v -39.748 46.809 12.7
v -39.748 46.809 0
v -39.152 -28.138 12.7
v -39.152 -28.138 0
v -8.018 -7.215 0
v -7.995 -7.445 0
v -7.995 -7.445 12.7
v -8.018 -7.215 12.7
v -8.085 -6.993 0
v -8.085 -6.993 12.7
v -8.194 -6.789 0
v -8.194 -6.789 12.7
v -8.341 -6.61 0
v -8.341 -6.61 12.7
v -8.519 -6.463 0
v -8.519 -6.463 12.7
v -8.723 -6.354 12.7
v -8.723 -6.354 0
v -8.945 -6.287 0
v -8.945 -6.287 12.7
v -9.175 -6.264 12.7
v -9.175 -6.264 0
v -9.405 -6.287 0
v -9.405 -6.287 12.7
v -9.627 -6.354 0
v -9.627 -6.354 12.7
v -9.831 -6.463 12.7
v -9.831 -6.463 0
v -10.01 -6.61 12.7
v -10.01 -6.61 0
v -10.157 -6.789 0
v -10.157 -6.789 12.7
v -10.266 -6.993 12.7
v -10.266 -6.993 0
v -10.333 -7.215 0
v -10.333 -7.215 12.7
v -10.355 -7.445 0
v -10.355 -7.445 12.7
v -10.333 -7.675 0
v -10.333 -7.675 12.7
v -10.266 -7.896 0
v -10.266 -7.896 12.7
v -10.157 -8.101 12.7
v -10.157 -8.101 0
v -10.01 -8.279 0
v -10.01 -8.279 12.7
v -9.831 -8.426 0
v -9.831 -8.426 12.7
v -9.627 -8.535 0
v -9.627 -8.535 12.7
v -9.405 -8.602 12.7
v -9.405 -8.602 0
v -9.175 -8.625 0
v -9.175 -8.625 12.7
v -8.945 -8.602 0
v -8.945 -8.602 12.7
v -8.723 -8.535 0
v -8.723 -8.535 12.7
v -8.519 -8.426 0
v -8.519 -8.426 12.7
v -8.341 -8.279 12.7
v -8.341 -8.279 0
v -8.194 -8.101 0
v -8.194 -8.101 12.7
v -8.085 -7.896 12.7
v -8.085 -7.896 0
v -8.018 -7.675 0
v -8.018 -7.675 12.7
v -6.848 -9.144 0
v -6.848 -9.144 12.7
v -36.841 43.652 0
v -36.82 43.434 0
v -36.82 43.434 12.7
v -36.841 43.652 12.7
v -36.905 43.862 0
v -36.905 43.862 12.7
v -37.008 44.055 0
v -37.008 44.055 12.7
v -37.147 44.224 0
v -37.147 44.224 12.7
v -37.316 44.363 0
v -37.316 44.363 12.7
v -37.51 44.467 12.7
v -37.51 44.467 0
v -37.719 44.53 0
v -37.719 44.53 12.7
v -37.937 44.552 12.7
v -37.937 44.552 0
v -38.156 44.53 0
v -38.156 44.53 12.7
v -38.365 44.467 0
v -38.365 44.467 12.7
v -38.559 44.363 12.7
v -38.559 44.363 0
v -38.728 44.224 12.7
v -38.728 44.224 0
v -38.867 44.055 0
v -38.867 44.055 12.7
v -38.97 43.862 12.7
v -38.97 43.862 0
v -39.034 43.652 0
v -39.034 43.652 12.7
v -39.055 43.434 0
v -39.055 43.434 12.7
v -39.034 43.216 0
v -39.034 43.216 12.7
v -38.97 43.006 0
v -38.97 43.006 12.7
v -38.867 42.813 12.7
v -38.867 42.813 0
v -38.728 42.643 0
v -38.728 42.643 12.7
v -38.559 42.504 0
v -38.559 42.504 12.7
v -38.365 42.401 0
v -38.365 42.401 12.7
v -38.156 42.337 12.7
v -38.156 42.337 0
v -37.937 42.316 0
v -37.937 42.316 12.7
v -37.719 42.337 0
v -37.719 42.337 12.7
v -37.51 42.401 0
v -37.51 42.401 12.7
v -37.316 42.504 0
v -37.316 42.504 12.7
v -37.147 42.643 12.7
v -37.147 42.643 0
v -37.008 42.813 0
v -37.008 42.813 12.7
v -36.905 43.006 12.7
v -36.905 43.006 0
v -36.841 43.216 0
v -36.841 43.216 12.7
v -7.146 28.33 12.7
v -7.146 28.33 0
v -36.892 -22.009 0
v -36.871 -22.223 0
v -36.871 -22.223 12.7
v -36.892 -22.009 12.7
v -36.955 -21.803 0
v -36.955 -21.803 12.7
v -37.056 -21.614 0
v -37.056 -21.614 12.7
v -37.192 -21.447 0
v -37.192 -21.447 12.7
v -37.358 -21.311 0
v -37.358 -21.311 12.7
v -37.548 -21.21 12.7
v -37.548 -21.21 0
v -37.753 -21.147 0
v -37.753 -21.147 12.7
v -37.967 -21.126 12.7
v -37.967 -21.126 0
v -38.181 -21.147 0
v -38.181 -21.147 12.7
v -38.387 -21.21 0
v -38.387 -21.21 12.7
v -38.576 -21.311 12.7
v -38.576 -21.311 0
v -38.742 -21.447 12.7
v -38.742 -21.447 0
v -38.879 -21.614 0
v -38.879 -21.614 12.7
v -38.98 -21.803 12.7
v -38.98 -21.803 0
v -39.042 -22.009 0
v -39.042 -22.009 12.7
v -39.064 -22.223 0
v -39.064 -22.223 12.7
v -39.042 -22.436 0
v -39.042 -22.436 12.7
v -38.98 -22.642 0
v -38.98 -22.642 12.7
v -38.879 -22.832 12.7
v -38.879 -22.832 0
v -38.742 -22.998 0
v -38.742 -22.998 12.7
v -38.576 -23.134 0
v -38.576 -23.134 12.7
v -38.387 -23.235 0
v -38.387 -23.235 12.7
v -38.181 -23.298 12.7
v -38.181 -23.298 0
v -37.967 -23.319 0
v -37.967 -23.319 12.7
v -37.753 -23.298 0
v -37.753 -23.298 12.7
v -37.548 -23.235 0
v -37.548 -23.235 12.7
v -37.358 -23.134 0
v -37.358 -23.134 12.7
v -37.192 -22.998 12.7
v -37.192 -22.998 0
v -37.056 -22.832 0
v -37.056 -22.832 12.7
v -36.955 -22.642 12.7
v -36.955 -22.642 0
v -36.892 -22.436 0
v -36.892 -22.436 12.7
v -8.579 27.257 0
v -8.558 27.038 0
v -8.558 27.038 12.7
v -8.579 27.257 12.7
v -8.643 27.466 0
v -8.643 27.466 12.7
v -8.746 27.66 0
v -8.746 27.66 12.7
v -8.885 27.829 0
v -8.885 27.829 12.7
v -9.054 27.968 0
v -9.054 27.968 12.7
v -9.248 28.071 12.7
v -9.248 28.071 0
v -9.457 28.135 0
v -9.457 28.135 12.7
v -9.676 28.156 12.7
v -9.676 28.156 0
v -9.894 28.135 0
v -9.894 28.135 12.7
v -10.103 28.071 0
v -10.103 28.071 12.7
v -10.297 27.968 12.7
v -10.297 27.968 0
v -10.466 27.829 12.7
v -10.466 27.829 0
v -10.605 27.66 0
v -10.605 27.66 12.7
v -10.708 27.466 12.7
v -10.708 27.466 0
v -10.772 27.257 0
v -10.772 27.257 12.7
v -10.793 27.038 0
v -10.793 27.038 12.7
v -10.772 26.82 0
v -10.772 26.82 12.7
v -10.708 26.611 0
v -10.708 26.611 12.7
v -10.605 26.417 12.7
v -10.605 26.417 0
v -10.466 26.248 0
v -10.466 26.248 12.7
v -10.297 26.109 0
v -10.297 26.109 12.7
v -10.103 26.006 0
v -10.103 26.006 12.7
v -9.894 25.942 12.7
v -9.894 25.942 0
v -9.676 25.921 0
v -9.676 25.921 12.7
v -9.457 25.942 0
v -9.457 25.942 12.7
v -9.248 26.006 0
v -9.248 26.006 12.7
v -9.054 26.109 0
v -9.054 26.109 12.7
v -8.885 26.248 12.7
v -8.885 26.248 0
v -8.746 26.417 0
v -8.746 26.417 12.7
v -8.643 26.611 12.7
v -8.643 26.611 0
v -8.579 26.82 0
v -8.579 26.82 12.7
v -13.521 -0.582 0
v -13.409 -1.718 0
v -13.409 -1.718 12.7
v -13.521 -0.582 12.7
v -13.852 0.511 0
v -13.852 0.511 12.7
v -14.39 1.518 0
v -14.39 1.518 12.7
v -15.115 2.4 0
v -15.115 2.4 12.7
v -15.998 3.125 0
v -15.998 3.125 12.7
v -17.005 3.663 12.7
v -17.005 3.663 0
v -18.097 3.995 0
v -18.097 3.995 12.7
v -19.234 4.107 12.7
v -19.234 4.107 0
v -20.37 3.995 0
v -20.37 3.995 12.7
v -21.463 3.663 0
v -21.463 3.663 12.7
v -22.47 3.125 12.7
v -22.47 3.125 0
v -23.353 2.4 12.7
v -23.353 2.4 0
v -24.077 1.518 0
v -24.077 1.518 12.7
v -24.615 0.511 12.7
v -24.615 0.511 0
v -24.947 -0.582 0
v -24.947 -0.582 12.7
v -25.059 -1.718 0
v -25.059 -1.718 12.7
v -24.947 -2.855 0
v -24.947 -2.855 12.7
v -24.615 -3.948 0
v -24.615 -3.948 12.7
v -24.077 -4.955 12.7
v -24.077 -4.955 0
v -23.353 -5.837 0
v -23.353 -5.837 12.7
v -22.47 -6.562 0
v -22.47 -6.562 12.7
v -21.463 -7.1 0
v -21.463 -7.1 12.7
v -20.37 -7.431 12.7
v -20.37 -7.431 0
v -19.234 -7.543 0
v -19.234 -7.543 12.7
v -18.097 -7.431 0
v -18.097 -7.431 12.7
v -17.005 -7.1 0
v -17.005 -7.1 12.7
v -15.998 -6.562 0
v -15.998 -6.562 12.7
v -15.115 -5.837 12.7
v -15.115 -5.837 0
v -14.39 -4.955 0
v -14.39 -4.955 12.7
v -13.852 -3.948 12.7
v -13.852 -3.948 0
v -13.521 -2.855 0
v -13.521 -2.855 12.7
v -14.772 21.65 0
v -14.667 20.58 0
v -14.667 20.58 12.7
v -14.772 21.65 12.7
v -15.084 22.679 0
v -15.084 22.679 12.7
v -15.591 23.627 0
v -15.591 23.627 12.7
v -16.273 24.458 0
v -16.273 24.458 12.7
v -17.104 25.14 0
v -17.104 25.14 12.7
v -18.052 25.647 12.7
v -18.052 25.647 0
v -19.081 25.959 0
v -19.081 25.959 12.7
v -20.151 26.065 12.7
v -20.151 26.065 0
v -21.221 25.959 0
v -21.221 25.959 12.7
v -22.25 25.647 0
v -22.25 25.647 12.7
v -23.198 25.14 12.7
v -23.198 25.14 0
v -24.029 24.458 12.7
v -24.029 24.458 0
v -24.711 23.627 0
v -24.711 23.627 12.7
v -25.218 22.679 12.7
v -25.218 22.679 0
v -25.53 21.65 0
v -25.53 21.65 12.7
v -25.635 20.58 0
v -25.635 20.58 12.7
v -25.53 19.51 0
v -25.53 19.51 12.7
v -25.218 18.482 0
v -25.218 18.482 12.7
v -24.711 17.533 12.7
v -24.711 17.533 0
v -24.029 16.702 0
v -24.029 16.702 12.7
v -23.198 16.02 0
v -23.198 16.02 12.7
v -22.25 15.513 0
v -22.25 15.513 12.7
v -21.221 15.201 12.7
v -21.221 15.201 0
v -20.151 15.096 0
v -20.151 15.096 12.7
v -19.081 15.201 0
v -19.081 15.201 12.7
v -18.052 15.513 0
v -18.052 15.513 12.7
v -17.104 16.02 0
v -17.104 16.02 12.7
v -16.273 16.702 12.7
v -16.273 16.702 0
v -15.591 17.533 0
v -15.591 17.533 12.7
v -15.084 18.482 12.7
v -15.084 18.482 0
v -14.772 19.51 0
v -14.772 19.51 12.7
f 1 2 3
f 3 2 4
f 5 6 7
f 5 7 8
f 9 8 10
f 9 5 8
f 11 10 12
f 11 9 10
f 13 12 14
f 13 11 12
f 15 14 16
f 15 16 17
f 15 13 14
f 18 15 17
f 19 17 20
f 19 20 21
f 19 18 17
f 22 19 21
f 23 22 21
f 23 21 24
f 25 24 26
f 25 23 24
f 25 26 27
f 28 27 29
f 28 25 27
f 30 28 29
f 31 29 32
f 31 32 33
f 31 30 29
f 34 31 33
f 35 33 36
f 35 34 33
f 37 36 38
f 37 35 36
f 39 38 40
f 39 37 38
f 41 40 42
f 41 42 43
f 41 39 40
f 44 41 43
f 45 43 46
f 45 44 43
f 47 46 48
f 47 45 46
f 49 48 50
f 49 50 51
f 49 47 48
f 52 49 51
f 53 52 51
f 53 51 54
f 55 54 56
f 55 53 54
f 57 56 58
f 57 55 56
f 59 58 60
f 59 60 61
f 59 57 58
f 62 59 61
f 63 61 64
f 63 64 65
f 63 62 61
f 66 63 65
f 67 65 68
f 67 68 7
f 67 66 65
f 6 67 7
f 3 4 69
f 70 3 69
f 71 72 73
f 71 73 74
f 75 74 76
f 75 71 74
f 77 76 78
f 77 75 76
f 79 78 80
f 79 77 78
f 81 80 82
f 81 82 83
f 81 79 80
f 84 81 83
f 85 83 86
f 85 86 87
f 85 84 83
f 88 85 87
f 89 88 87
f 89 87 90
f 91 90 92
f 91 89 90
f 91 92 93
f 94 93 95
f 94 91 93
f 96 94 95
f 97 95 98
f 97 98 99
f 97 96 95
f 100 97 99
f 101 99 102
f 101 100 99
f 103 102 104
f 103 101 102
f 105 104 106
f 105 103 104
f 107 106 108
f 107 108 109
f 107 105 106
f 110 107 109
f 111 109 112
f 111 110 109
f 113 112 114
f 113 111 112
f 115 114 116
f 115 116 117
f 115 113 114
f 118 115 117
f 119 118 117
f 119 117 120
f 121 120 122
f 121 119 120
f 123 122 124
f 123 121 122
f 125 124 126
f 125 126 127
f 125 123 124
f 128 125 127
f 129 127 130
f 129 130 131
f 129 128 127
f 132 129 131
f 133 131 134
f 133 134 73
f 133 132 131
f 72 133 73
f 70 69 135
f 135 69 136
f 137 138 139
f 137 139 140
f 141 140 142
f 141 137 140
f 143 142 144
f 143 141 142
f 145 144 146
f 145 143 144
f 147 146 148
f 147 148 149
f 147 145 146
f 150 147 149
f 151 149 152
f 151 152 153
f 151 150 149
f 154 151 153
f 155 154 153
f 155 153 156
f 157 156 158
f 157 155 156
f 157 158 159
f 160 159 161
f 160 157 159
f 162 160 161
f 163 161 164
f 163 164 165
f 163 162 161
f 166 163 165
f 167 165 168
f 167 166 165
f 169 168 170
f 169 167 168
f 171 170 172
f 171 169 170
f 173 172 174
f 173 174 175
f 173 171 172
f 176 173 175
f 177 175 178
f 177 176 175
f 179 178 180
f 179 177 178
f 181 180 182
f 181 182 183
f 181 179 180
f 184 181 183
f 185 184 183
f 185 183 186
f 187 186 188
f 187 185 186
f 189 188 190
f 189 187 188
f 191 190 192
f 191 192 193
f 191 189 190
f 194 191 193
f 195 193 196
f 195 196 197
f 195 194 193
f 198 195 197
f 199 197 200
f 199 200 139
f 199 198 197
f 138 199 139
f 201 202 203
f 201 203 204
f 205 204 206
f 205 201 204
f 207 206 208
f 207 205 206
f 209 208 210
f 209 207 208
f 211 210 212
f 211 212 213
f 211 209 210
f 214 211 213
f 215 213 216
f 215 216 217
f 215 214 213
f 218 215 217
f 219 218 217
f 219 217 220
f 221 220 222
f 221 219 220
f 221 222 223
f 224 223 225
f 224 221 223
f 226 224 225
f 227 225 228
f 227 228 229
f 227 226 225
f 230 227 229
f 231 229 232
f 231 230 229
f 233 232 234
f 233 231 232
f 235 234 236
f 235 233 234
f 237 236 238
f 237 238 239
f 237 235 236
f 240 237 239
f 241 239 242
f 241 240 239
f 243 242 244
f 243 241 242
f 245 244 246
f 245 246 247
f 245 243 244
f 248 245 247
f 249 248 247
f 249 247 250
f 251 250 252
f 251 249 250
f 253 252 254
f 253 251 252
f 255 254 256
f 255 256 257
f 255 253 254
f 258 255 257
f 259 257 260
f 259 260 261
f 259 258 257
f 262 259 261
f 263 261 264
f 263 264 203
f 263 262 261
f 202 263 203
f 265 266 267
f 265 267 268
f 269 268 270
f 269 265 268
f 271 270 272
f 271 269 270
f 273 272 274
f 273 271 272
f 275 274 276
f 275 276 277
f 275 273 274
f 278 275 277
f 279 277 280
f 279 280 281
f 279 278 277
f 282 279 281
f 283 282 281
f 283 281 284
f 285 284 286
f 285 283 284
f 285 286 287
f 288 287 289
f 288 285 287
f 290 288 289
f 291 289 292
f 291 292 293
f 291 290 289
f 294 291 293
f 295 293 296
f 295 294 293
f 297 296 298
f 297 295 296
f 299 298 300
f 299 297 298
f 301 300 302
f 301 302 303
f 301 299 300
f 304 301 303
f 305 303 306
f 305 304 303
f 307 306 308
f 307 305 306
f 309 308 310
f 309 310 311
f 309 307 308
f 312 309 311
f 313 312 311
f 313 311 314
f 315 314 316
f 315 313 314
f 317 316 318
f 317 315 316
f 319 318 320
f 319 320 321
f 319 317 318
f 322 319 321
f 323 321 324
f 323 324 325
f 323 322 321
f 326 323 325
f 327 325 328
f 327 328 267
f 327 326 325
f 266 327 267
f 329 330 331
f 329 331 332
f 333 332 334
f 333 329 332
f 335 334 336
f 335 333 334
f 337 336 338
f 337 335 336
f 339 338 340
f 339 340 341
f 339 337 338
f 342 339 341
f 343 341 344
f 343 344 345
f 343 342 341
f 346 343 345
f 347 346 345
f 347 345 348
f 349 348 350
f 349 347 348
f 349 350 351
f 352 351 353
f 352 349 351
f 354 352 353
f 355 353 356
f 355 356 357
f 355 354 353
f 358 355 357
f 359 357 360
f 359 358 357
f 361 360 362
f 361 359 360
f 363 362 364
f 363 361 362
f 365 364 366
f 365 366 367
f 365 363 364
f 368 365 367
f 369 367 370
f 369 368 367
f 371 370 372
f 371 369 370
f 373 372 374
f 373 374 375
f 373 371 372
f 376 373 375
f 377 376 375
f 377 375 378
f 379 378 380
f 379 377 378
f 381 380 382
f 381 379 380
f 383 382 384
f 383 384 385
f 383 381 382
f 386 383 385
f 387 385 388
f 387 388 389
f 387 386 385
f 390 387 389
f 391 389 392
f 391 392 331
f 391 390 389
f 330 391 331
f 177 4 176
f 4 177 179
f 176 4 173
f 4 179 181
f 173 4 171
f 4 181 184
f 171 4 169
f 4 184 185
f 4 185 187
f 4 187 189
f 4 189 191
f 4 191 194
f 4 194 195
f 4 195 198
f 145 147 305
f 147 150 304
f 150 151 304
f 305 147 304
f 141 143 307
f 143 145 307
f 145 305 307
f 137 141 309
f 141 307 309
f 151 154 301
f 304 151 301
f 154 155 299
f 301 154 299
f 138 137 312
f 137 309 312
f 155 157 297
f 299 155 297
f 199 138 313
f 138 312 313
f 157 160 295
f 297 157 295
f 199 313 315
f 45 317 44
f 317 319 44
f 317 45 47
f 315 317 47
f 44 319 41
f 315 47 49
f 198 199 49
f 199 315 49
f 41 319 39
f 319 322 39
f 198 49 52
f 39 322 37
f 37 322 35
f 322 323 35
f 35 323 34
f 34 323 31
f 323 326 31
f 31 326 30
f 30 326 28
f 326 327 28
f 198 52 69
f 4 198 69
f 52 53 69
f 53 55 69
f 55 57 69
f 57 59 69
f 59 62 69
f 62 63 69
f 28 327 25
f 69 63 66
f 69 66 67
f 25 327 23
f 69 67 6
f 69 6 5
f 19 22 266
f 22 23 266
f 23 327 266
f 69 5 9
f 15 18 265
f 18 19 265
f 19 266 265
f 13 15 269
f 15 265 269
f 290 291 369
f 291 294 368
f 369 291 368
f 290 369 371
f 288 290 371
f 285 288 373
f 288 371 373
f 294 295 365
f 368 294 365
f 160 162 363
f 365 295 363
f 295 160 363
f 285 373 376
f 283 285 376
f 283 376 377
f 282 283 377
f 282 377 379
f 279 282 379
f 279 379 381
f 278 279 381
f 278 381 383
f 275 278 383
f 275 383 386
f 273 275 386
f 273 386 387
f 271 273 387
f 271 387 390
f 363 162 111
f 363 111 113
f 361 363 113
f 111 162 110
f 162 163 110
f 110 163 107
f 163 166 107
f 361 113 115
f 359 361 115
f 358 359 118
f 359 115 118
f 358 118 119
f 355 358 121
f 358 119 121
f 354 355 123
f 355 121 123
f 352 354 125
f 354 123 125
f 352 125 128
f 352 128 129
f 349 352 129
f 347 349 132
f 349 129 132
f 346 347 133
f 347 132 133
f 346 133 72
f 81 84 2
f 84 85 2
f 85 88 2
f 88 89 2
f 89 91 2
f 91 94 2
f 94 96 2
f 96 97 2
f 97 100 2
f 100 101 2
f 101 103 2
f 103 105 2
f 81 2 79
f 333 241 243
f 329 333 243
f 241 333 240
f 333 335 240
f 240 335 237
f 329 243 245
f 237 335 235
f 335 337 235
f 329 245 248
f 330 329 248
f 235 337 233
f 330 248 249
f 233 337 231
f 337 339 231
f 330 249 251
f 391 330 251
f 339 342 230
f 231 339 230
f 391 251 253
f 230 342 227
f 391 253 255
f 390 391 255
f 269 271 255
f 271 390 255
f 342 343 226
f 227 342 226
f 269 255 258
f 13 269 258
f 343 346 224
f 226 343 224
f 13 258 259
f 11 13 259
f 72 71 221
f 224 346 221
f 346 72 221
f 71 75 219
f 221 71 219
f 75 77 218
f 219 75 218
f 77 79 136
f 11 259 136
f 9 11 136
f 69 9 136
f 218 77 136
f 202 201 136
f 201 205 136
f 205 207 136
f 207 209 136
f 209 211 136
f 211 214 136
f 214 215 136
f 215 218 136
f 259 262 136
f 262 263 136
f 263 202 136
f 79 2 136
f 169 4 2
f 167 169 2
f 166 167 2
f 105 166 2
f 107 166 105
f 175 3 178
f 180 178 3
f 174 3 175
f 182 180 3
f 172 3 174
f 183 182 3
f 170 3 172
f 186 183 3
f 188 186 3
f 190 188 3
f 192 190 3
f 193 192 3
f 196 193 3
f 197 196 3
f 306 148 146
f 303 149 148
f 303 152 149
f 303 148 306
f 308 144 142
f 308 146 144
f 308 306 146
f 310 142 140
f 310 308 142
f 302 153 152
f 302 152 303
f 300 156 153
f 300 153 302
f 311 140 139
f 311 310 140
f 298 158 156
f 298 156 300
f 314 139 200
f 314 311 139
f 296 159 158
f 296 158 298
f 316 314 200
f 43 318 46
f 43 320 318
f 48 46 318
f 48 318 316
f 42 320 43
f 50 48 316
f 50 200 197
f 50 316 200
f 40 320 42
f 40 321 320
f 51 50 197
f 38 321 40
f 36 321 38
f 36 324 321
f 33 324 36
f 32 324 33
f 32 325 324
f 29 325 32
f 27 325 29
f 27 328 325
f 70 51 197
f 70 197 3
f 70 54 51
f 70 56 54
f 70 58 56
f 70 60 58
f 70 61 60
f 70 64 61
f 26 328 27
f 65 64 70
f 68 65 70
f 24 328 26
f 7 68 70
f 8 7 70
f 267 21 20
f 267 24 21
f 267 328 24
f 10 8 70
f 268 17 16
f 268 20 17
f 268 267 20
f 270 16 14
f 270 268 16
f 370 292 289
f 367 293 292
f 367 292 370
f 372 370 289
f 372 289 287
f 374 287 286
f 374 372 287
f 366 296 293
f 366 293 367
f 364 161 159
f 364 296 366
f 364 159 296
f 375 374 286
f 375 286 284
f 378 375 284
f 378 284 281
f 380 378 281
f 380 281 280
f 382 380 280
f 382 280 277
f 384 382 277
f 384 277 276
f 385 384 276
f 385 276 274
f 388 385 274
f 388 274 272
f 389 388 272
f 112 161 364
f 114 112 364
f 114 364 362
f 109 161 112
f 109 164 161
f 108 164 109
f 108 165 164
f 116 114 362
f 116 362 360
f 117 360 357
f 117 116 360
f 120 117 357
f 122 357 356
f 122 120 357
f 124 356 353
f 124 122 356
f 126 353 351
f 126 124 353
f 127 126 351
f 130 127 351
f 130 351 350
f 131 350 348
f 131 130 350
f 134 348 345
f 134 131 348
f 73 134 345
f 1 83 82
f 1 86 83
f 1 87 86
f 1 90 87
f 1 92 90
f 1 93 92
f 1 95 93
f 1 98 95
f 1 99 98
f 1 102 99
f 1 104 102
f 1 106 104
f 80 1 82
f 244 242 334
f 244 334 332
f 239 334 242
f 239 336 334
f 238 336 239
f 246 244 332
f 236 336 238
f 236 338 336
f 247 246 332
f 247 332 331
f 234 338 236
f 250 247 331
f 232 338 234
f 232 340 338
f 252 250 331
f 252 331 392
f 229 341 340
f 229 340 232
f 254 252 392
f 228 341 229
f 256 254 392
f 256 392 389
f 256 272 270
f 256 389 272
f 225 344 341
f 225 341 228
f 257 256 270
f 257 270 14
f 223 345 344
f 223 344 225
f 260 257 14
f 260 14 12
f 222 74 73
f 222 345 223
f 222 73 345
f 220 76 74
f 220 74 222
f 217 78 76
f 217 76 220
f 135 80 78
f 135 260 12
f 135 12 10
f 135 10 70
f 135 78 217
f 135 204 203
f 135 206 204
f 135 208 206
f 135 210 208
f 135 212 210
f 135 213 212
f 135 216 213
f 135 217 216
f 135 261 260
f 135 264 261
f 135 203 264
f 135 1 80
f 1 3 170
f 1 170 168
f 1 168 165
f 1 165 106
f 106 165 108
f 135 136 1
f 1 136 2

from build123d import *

# Parameters (mm, degrees)
F0_R     = 1.096214
F0_R_2   = 5.824912
F0_R_3   = 1.180333
F0_R_4   = 1.117938
F0_R_5   = 5.484301
F1_DEPTH = 12.7


with BuildPart() as f1:
    # F0 (on Top) → F1 (new body)
    with BuildSketch(Plane.XY):
        Polygon((-7.145739, 28.330129), (-39.747888, 46.809014), (-39.152107, -28.138449), (-6.847849, -9.143603), align=None)
        with Locations((-37.967294, -22.222633)):
            Circle(F0_R, mode=Mode.SUBTRACT)
        with Locations((-19.233698, -1.718403)):
            Circle(F0_R_2, mode=Mode.SUBTRACT)
        with Locations((-9.175166, -7.444786)):
            Circle(F0_R_3, mode=Mode.SUBTRACT)
        with Locations((-37.937455, 43.433934)):
            Circle(F0_R_4, mode=Mode.SUBTRACT)
        with Locations((-20.150922, 20.580299)):
            Circle(F0_R_5, mode=Mode.SUBTRACT)
        with Locations((-9.675507, 27.038466)):
            Circle(F0_R_4, mode=Mode.SUBTRACT)
    extrude(amount=F1_DEPTH)


solid = f1.part
